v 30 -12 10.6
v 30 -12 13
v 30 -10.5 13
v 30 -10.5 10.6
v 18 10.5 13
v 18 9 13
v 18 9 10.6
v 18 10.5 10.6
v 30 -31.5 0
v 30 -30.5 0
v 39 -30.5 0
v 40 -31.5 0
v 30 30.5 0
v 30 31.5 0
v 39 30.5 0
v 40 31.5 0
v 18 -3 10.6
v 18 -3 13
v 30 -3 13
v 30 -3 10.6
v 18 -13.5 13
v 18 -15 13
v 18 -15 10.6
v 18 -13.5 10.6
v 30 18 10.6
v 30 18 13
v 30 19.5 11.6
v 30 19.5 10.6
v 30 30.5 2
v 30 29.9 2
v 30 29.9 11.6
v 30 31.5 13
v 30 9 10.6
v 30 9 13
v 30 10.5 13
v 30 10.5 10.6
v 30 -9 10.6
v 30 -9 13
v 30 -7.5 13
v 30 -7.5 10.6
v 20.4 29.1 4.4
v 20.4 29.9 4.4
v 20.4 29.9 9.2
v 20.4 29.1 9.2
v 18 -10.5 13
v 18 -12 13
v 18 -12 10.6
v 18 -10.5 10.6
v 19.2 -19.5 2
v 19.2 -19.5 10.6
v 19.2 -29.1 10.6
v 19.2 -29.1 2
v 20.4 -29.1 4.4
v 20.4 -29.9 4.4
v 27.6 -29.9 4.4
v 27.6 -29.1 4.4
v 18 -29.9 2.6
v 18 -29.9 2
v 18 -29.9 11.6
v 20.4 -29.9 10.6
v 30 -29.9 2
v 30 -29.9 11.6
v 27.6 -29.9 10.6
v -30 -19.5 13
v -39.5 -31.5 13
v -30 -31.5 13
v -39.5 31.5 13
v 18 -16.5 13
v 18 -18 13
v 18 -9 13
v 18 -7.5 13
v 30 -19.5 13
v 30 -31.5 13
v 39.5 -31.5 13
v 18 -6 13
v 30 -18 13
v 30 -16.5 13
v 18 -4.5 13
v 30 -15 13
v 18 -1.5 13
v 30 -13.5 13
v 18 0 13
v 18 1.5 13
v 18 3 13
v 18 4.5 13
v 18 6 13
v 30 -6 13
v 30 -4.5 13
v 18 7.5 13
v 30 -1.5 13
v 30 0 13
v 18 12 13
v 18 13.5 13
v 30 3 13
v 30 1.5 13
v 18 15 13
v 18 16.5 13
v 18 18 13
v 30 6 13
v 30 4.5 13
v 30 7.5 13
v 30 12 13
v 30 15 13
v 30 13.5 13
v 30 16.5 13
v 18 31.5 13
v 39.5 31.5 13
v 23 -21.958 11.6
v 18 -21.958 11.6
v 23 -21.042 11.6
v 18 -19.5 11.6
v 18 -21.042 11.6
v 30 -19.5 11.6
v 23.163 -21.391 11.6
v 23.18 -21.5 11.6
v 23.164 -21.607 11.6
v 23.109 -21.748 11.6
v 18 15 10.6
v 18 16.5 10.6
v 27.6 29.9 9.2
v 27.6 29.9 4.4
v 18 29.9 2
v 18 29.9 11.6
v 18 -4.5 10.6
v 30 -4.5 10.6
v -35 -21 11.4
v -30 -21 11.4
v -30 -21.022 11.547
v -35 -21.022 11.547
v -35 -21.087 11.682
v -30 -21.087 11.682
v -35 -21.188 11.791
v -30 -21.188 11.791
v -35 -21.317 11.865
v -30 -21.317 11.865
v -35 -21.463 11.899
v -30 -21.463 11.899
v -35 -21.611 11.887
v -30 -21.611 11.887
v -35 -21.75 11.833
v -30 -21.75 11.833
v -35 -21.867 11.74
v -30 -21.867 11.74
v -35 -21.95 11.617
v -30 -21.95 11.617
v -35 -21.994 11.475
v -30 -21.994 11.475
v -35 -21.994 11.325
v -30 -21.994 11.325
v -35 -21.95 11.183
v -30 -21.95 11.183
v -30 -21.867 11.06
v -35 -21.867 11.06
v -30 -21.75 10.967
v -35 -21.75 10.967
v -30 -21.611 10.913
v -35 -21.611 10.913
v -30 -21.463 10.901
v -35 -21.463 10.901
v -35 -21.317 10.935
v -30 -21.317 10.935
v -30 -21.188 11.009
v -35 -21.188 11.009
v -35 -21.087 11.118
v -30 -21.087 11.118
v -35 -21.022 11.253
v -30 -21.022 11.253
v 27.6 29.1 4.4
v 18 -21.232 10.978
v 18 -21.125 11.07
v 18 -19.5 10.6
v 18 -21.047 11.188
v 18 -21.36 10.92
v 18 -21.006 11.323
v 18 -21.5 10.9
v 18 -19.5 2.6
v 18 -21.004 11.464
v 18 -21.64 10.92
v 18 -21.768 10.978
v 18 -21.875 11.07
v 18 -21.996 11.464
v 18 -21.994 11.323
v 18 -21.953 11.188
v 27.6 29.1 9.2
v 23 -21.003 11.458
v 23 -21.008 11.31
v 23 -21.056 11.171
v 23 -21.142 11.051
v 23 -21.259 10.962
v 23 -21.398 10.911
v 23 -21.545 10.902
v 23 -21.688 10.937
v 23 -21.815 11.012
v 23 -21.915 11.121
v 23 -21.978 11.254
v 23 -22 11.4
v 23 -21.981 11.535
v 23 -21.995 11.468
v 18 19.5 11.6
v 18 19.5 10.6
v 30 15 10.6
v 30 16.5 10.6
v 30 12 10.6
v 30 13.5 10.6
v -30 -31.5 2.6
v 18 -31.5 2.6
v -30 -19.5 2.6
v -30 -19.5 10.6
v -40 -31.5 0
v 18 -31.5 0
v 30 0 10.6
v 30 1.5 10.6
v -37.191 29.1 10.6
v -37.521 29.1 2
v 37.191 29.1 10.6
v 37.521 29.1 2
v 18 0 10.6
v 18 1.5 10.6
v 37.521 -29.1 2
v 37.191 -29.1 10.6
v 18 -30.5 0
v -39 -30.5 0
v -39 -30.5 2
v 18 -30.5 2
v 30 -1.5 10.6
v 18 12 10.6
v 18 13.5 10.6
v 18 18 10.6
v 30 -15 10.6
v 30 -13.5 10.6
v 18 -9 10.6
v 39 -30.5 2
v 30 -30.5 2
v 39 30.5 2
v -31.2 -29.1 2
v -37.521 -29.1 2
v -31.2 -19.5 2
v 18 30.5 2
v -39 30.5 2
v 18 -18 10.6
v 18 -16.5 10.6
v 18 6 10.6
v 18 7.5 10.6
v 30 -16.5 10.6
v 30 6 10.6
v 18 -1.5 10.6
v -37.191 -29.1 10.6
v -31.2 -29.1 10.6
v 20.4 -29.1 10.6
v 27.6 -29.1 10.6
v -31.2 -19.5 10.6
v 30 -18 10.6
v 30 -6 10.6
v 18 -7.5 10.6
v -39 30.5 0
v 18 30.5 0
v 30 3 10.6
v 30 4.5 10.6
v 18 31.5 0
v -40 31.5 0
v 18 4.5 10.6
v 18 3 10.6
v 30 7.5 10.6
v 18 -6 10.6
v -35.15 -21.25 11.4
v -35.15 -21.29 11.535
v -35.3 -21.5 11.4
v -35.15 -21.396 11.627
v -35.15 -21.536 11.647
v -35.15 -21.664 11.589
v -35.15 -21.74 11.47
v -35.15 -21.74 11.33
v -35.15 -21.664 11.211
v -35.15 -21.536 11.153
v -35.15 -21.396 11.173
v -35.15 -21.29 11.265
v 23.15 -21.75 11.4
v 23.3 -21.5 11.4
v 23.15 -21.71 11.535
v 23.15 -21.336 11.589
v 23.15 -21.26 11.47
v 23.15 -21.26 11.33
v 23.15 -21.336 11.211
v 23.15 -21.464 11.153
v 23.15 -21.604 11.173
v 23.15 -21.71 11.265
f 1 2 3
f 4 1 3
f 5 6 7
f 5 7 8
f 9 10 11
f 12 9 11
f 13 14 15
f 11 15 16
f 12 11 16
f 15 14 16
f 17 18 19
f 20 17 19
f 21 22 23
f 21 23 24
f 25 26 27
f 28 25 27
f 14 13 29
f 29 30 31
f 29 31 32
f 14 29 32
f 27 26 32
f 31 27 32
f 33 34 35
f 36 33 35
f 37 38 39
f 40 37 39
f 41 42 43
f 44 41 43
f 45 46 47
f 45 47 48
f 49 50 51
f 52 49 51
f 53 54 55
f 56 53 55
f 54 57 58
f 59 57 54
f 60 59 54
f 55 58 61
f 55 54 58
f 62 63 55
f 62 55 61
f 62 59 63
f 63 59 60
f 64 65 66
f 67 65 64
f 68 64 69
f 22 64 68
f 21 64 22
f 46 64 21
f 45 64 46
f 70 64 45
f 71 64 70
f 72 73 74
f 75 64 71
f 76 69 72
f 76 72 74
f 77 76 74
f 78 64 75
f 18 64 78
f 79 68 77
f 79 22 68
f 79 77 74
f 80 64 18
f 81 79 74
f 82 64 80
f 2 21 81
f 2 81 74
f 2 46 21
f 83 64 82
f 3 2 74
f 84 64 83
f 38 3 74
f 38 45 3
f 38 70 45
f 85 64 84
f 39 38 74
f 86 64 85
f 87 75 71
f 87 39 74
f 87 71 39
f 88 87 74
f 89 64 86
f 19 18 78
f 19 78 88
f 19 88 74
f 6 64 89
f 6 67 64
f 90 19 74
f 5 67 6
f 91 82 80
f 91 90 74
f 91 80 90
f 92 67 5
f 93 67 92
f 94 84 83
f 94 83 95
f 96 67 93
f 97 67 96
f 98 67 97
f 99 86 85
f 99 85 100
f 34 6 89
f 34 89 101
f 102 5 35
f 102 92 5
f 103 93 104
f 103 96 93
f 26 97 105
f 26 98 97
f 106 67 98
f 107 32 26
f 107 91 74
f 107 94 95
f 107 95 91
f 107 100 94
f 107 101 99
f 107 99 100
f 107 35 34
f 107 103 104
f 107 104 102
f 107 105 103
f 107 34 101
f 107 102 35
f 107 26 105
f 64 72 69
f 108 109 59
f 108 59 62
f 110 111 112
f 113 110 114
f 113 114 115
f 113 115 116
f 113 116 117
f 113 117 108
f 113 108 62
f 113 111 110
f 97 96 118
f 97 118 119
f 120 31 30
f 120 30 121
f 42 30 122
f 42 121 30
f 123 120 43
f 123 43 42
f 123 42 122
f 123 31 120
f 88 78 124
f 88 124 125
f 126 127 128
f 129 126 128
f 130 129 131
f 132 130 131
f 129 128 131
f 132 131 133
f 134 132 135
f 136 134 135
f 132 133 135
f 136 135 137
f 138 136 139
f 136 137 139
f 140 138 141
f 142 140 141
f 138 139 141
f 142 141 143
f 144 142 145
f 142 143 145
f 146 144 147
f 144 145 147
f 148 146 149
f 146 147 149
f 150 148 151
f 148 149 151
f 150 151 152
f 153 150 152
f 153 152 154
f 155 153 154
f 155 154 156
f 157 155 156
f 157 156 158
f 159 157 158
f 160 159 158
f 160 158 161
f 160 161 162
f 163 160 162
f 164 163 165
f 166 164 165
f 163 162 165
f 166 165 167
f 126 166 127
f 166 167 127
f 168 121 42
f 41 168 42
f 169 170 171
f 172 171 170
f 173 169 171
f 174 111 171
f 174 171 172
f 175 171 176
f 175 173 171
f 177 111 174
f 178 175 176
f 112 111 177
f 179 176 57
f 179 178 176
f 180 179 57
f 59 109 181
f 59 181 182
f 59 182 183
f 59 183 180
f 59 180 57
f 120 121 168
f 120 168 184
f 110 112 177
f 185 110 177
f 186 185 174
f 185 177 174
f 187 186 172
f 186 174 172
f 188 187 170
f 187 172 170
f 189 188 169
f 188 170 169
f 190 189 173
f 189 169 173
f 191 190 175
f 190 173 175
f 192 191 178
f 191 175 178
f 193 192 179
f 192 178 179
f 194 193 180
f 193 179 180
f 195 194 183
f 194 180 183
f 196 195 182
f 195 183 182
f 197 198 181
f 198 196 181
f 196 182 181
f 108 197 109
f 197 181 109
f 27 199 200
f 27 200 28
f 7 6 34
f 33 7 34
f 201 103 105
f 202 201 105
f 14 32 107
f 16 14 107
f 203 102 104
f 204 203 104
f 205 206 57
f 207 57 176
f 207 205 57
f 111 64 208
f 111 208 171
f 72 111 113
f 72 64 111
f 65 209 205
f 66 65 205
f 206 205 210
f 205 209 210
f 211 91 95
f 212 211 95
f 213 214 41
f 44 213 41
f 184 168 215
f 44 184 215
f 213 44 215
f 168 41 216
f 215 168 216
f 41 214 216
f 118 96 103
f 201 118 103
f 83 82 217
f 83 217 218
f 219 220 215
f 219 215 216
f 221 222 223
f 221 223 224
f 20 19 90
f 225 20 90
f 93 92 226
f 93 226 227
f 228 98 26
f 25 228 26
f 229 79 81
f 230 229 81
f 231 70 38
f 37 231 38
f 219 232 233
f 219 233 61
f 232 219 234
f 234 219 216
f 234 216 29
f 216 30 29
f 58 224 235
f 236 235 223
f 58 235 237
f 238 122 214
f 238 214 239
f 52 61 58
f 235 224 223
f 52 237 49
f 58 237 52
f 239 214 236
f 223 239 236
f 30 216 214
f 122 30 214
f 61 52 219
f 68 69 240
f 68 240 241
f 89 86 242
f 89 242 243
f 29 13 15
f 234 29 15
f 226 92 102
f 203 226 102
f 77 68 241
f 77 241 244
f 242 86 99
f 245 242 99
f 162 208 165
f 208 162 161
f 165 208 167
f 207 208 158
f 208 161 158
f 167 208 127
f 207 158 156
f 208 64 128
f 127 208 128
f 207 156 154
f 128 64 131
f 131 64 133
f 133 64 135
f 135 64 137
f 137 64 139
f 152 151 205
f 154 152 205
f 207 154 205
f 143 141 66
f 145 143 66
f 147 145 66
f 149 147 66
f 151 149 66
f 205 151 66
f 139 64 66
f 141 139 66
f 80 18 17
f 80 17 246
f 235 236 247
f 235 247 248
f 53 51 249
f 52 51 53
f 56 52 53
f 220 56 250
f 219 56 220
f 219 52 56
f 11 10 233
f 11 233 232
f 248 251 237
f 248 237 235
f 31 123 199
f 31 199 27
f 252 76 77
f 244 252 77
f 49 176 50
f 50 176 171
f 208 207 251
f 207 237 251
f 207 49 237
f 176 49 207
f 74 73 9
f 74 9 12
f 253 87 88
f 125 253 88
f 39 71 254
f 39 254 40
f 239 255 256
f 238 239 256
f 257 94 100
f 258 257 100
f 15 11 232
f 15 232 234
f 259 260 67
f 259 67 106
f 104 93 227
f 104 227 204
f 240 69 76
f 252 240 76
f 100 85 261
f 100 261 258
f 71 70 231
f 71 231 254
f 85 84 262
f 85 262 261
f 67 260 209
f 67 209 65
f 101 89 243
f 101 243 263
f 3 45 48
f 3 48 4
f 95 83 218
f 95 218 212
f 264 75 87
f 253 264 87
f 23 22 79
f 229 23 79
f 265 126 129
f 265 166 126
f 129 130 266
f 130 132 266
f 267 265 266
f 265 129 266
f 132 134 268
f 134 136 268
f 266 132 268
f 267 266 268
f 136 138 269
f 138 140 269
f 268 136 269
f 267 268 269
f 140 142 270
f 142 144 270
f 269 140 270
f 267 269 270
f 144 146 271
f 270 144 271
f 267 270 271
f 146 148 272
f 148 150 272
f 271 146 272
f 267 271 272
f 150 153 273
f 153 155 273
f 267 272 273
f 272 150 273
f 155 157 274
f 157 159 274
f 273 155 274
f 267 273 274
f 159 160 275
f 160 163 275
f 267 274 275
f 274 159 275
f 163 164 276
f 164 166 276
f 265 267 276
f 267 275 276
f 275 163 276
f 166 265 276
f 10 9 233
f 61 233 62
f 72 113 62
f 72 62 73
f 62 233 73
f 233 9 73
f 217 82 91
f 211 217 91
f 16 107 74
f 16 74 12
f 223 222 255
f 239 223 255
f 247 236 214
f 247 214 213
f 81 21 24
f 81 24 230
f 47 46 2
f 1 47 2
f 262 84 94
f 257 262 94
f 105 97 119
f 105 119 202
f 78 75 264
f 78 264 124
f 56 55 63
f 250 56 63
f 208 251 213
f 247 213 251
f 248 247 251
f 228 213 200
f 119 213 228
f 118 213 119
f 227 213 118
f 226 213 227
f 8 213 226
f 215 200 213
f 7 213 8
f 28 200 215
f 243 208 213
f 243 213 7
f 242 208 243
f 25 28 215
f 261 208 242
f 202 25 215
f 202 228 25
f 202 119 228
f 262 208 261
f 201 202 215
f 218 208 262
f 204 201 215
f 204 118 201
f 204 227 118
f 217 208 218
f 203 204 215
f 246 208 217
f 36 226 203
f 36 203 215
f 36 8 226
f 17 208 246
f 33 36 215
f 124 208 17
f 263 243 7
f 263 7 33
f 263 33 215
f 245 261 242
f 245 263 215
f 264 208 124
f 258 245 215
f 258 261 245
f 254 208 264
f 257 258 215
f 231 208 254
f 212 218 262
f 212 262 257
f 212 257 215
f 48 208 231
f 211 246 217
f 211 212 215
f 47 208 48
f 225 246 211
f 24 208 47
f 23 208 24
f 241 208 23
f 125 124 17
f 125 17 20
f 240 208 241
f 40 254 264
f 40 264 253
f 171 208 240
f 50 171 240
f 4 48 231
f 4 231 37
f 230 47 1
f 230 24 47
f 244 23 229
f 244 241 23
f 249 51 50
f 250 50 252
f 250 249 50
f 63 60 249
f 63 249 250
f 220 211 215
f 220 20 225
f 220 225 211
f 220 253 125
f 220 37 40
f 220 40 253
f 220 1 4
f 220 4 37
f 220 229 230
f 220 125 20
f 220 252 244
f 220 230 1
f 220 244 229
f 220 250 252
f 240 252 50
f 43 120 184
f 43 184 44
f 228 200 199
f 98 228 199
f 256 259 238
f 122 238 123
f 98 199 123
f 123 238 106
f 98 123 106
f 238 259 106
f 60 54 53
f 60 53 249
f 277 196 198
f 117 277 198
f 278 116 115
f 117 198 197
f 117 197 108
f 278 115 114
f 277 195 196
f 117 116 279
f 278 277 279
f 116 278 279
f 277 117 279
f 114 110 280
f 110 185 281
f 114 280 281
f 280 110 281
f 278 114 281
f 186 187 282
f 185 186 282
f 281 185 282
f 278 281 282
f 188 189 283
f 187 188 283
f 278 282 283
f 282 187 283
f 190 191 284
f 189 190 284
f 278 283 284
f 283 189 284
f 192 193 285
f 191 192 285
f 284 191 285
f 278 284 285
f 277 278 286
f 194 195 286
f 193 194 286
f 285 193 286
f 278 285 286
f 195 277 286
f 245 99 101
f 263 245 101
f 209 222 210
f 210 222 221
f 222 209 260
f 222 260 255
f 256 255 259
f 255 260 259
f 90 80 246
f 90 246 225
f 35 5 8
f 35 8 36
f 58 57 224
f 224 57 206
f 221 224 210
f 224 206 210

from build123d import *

# Parameters (mm, degrees)
F0_W      = 80
F0_H      = 63
F0_W_2    = 78
F0_H_2    = 61
F1_DEPTH  = 13
F3_DEPTH  = 63
F4_T      = -2.4
F5_DEPTH  = 2
F6_DEPTH  = 1.6
F7_W      = 7.2
F7_H      = 6.2
F8_DEPTH  = 2
F9_W      = 12
F9_H      = 12
F9_H_2    = 10.4
F10_DEPTH = 1.4
F9_H_3    = 1.5
F11_DEPTH = 3
F12_W     = 12
F12_H     = 11.6
F13_DEPTH = 1.6
F14_W     = 7.2
F14_H     = 4.8
F15_DEPTH = 3
F2_W      = 48
F2_H      = 10.4
F16_DEPTH = 12
F17_W     = 1.2
F17_H     = 9.6
F18_DEPTH = 8.6
F19_W     = 9.6
F19_H     = 0.6
F20_DEPTH = 48
F21_D     = 1
F21_DEPTH = 5
F21_TIP   = 0.3004303095
F23_D     = 1
F23_DEPTH = 5
F23_TIP   = 0.3004303095


with BuildPart() as f1:
    # F0 (on Top) → F1 (new body)
    with BuildSketch(Plane.XY):
        Rectangle(F0_W, F0_H)
        Rectangle(F0_W_2, F0_H_2, mode=Mode.SUBTRACT)
        Rectangle(F0_W_2, F0_H_2)
    extrude(amount=F1_DEPTH)

    # F2 (on face) → F3 (cut)
    with BuildSketch(Plane.XZ.offset(31.5)):
        Polygon((-39.5, 13), (-40, 13), (-40, 0), align=None)
        Polygon((39.5, 13), (40, 0), (40, 13), align=None)
    extrude(amount=-F3_DEPTH, mode=Mode.SUBTRACT)

    # F4
    f4_openings = [f1.faces().sort_by_distance(p)[0] for p in [
        (0, 0, 0),
    ]]
    offset(amount=F4_T, openings=f4_openings)

    # F0 (on Top) → F5 (cut)
    with BuildSketch(Plane.XY):
        Rectangle(F0_W_2, F0_H_2)
    extrude(amount=F5_DEPTH, mode=Mode.SUBTRACT)

    # F2 (on face) → F6 (cut)
    with BuildSketch(Plane.XZ.offset(31.5)):
        Polygon((18, 2.6), (18, 0), (30, 0), (30, 13), (18, 13), align=None)
    extrude(amount=-F6_DEPTH, mode=Mode.SUBTRACT)

    # F7 (on face) → F8 (cut)
    with BuildSketch(Plane.XZ.offset(29.9)):
        with Locations((24, 7.5)):
            Rectangle(F7_W, F7_H)
    extrude(amount=-F8_DEPTH, mode=Mode.SUBTRACT)

    # F9 (on face) → F10 (cut)
    with BuildSketch(Plane.XY.offset(13)):
        with Locations((24, 25.5)):
            Rectangle(F9_W, F9_H)
        with Locations((24, -24.7)):
            Rectangle(F9_W, F9_H_2)
    extrude(amount=-F10_DEPTH, mode=Mode.SUBTRACT)

    # F9 (on face) → F11 (cut)
    with BuildSketch(Plane.XY.offset(13)):
        with Locations((24, -17.25)):
            Rectangle(F9_W, F9_H_3)
        with Locations((24, -14.25)):
            Rectangle(F9_W, F9_H_3)
        with Locations((24, -11.25)):
            Rectangle(F9_W, F9_H_3)
        with Locations((24, -8.25)):
            Rectangle(F9_W, F9_H_3)
        with Locations((24, -5.25)):
            Rectangle(F9_W, F9_H_3)
        with Locations((24, 0.75)):
            Rectangle(F9_W, F9_H_3)
        with Locations((24, -2.25)):
            Rectangle(F9_W, F9_H_3)
        with Locations((24, 3.75)):
            Rectangle(F9_W, F9_H_3)
        with Locations((24, 6.75)):
            Rectangle(F9_W, F9_H_3)
        with Locations((24, 9.75)):
            Rectangle(F9_W, F9_H_3)
        with Locations((24, 12.75)):
            Rectangle(F9_W, F9_H_3)
        with Locations((24, 15.75)):
            Rectangle(F9_W, F9_H_3)
        with Locations((24, 18.75)):
            Rectangle(F9_W, F9_H_3)
    extrude(amount=-F11_DEPTH, mode=Mode.SUBTRACT)

    # F12 (on face) → F13 (cut)
    with BuildSketch(Plane(origin=(0, 31.5, 0), x_dir=(-1, 0, 0), z_dir=(0, 1, 0))):
        with Locations((-24, 5.8)):
            Rectangle(F12_W, F12_H)
    extrude(amount=-F13_DEPTH, mode=Mode.SUBTRACT)

    # F14 (on face) → F15 (cut)
    with BuildSketch(Plane(origin=(0, 29.9, 0), x_dir=(-1, 0, 0), z_dir=(0, 1, 0))):
        with Locations((-24, 6.8)):
            Rectangle(F14_W, F14_H)
    extrude(amount=-F15_DEPTH, mode=Mode.SUBTRACT)

    # F2 (on face) → F16 (cut)
    with BuildSketch(Plane.XZ.offset(31.5)):
        with Locations((-6, 7.8)):
            Rectangle(F2_W, F2_H)
    extrude(amount=-F16_DEPTH, mode=Mode.SUBTRACT)

    # F17 (on face) → F18 (join)
    with BuildSketch(Plane(origin=(0, 0, 10.6), x_dir=(1, 0, 0), z_dir=(0, 0, -1))):
        with Locations((18.6, 24.3)):
            Rectangle(F17_W, F17_H)
        with Locations((-30.6, 24.3)):
            Rectangle(F17_W, F17_H)
    extrude(amount=F18_DEPTH)

    # F19 (on face) → F20 (join)
    with BuildSketch(Plane.YZ.offset(-30)):
        with Locations((-24.3, 2.3)):
            Rectangle(F19_W, F19_H)
    extrude(amount=F20_DEPTH)

    # F21 (one way)
    with BuildSketch(Plane.YZ.offset(-30)):
        with Locations((-21.5, 11.4)):
            Circle(F21_D / 2)
    extrude(amount=-F21_DEPTH, mode=Mode.SUBTRACT)
    with Locations(Plane.YZ.offset(-30)):
        with Locations((-21.5, 11.4)):
            with Locations((0, 0, -(F21_DEPTH + F21_TIP / 2))):  # 118° drill point
                Cone(0, F21_D / 2, F21_TIP, mode=Mode.SUBTRACT)

    # F23 (one way)
    with BuildSketch(Plane(origin=(18, 0, 0), x_dir=(0, -1, 0), z_dir=(-1, 0, 0))):
        with Locations((21.5, 11.4)):
            Circle(F23_D / 2)
    extrude(amount=-F23_DEPTH, mode=Mode.SUBTRACT)
    with Locations(Plane(origin=(18, 0, 0), x_dir=(0, -1, 0), z_dir=(-1, 0, 0))):
        with Locations((21.5, 11.4)):
            with Locations((0, 0, -(F23_DEPTH + F23_TIP / 2))):  # 118° drill point
                Cone(0, F23_D / 2, F23_TIP, mode=Mode.SUBTRACT)


solid = f1.part
